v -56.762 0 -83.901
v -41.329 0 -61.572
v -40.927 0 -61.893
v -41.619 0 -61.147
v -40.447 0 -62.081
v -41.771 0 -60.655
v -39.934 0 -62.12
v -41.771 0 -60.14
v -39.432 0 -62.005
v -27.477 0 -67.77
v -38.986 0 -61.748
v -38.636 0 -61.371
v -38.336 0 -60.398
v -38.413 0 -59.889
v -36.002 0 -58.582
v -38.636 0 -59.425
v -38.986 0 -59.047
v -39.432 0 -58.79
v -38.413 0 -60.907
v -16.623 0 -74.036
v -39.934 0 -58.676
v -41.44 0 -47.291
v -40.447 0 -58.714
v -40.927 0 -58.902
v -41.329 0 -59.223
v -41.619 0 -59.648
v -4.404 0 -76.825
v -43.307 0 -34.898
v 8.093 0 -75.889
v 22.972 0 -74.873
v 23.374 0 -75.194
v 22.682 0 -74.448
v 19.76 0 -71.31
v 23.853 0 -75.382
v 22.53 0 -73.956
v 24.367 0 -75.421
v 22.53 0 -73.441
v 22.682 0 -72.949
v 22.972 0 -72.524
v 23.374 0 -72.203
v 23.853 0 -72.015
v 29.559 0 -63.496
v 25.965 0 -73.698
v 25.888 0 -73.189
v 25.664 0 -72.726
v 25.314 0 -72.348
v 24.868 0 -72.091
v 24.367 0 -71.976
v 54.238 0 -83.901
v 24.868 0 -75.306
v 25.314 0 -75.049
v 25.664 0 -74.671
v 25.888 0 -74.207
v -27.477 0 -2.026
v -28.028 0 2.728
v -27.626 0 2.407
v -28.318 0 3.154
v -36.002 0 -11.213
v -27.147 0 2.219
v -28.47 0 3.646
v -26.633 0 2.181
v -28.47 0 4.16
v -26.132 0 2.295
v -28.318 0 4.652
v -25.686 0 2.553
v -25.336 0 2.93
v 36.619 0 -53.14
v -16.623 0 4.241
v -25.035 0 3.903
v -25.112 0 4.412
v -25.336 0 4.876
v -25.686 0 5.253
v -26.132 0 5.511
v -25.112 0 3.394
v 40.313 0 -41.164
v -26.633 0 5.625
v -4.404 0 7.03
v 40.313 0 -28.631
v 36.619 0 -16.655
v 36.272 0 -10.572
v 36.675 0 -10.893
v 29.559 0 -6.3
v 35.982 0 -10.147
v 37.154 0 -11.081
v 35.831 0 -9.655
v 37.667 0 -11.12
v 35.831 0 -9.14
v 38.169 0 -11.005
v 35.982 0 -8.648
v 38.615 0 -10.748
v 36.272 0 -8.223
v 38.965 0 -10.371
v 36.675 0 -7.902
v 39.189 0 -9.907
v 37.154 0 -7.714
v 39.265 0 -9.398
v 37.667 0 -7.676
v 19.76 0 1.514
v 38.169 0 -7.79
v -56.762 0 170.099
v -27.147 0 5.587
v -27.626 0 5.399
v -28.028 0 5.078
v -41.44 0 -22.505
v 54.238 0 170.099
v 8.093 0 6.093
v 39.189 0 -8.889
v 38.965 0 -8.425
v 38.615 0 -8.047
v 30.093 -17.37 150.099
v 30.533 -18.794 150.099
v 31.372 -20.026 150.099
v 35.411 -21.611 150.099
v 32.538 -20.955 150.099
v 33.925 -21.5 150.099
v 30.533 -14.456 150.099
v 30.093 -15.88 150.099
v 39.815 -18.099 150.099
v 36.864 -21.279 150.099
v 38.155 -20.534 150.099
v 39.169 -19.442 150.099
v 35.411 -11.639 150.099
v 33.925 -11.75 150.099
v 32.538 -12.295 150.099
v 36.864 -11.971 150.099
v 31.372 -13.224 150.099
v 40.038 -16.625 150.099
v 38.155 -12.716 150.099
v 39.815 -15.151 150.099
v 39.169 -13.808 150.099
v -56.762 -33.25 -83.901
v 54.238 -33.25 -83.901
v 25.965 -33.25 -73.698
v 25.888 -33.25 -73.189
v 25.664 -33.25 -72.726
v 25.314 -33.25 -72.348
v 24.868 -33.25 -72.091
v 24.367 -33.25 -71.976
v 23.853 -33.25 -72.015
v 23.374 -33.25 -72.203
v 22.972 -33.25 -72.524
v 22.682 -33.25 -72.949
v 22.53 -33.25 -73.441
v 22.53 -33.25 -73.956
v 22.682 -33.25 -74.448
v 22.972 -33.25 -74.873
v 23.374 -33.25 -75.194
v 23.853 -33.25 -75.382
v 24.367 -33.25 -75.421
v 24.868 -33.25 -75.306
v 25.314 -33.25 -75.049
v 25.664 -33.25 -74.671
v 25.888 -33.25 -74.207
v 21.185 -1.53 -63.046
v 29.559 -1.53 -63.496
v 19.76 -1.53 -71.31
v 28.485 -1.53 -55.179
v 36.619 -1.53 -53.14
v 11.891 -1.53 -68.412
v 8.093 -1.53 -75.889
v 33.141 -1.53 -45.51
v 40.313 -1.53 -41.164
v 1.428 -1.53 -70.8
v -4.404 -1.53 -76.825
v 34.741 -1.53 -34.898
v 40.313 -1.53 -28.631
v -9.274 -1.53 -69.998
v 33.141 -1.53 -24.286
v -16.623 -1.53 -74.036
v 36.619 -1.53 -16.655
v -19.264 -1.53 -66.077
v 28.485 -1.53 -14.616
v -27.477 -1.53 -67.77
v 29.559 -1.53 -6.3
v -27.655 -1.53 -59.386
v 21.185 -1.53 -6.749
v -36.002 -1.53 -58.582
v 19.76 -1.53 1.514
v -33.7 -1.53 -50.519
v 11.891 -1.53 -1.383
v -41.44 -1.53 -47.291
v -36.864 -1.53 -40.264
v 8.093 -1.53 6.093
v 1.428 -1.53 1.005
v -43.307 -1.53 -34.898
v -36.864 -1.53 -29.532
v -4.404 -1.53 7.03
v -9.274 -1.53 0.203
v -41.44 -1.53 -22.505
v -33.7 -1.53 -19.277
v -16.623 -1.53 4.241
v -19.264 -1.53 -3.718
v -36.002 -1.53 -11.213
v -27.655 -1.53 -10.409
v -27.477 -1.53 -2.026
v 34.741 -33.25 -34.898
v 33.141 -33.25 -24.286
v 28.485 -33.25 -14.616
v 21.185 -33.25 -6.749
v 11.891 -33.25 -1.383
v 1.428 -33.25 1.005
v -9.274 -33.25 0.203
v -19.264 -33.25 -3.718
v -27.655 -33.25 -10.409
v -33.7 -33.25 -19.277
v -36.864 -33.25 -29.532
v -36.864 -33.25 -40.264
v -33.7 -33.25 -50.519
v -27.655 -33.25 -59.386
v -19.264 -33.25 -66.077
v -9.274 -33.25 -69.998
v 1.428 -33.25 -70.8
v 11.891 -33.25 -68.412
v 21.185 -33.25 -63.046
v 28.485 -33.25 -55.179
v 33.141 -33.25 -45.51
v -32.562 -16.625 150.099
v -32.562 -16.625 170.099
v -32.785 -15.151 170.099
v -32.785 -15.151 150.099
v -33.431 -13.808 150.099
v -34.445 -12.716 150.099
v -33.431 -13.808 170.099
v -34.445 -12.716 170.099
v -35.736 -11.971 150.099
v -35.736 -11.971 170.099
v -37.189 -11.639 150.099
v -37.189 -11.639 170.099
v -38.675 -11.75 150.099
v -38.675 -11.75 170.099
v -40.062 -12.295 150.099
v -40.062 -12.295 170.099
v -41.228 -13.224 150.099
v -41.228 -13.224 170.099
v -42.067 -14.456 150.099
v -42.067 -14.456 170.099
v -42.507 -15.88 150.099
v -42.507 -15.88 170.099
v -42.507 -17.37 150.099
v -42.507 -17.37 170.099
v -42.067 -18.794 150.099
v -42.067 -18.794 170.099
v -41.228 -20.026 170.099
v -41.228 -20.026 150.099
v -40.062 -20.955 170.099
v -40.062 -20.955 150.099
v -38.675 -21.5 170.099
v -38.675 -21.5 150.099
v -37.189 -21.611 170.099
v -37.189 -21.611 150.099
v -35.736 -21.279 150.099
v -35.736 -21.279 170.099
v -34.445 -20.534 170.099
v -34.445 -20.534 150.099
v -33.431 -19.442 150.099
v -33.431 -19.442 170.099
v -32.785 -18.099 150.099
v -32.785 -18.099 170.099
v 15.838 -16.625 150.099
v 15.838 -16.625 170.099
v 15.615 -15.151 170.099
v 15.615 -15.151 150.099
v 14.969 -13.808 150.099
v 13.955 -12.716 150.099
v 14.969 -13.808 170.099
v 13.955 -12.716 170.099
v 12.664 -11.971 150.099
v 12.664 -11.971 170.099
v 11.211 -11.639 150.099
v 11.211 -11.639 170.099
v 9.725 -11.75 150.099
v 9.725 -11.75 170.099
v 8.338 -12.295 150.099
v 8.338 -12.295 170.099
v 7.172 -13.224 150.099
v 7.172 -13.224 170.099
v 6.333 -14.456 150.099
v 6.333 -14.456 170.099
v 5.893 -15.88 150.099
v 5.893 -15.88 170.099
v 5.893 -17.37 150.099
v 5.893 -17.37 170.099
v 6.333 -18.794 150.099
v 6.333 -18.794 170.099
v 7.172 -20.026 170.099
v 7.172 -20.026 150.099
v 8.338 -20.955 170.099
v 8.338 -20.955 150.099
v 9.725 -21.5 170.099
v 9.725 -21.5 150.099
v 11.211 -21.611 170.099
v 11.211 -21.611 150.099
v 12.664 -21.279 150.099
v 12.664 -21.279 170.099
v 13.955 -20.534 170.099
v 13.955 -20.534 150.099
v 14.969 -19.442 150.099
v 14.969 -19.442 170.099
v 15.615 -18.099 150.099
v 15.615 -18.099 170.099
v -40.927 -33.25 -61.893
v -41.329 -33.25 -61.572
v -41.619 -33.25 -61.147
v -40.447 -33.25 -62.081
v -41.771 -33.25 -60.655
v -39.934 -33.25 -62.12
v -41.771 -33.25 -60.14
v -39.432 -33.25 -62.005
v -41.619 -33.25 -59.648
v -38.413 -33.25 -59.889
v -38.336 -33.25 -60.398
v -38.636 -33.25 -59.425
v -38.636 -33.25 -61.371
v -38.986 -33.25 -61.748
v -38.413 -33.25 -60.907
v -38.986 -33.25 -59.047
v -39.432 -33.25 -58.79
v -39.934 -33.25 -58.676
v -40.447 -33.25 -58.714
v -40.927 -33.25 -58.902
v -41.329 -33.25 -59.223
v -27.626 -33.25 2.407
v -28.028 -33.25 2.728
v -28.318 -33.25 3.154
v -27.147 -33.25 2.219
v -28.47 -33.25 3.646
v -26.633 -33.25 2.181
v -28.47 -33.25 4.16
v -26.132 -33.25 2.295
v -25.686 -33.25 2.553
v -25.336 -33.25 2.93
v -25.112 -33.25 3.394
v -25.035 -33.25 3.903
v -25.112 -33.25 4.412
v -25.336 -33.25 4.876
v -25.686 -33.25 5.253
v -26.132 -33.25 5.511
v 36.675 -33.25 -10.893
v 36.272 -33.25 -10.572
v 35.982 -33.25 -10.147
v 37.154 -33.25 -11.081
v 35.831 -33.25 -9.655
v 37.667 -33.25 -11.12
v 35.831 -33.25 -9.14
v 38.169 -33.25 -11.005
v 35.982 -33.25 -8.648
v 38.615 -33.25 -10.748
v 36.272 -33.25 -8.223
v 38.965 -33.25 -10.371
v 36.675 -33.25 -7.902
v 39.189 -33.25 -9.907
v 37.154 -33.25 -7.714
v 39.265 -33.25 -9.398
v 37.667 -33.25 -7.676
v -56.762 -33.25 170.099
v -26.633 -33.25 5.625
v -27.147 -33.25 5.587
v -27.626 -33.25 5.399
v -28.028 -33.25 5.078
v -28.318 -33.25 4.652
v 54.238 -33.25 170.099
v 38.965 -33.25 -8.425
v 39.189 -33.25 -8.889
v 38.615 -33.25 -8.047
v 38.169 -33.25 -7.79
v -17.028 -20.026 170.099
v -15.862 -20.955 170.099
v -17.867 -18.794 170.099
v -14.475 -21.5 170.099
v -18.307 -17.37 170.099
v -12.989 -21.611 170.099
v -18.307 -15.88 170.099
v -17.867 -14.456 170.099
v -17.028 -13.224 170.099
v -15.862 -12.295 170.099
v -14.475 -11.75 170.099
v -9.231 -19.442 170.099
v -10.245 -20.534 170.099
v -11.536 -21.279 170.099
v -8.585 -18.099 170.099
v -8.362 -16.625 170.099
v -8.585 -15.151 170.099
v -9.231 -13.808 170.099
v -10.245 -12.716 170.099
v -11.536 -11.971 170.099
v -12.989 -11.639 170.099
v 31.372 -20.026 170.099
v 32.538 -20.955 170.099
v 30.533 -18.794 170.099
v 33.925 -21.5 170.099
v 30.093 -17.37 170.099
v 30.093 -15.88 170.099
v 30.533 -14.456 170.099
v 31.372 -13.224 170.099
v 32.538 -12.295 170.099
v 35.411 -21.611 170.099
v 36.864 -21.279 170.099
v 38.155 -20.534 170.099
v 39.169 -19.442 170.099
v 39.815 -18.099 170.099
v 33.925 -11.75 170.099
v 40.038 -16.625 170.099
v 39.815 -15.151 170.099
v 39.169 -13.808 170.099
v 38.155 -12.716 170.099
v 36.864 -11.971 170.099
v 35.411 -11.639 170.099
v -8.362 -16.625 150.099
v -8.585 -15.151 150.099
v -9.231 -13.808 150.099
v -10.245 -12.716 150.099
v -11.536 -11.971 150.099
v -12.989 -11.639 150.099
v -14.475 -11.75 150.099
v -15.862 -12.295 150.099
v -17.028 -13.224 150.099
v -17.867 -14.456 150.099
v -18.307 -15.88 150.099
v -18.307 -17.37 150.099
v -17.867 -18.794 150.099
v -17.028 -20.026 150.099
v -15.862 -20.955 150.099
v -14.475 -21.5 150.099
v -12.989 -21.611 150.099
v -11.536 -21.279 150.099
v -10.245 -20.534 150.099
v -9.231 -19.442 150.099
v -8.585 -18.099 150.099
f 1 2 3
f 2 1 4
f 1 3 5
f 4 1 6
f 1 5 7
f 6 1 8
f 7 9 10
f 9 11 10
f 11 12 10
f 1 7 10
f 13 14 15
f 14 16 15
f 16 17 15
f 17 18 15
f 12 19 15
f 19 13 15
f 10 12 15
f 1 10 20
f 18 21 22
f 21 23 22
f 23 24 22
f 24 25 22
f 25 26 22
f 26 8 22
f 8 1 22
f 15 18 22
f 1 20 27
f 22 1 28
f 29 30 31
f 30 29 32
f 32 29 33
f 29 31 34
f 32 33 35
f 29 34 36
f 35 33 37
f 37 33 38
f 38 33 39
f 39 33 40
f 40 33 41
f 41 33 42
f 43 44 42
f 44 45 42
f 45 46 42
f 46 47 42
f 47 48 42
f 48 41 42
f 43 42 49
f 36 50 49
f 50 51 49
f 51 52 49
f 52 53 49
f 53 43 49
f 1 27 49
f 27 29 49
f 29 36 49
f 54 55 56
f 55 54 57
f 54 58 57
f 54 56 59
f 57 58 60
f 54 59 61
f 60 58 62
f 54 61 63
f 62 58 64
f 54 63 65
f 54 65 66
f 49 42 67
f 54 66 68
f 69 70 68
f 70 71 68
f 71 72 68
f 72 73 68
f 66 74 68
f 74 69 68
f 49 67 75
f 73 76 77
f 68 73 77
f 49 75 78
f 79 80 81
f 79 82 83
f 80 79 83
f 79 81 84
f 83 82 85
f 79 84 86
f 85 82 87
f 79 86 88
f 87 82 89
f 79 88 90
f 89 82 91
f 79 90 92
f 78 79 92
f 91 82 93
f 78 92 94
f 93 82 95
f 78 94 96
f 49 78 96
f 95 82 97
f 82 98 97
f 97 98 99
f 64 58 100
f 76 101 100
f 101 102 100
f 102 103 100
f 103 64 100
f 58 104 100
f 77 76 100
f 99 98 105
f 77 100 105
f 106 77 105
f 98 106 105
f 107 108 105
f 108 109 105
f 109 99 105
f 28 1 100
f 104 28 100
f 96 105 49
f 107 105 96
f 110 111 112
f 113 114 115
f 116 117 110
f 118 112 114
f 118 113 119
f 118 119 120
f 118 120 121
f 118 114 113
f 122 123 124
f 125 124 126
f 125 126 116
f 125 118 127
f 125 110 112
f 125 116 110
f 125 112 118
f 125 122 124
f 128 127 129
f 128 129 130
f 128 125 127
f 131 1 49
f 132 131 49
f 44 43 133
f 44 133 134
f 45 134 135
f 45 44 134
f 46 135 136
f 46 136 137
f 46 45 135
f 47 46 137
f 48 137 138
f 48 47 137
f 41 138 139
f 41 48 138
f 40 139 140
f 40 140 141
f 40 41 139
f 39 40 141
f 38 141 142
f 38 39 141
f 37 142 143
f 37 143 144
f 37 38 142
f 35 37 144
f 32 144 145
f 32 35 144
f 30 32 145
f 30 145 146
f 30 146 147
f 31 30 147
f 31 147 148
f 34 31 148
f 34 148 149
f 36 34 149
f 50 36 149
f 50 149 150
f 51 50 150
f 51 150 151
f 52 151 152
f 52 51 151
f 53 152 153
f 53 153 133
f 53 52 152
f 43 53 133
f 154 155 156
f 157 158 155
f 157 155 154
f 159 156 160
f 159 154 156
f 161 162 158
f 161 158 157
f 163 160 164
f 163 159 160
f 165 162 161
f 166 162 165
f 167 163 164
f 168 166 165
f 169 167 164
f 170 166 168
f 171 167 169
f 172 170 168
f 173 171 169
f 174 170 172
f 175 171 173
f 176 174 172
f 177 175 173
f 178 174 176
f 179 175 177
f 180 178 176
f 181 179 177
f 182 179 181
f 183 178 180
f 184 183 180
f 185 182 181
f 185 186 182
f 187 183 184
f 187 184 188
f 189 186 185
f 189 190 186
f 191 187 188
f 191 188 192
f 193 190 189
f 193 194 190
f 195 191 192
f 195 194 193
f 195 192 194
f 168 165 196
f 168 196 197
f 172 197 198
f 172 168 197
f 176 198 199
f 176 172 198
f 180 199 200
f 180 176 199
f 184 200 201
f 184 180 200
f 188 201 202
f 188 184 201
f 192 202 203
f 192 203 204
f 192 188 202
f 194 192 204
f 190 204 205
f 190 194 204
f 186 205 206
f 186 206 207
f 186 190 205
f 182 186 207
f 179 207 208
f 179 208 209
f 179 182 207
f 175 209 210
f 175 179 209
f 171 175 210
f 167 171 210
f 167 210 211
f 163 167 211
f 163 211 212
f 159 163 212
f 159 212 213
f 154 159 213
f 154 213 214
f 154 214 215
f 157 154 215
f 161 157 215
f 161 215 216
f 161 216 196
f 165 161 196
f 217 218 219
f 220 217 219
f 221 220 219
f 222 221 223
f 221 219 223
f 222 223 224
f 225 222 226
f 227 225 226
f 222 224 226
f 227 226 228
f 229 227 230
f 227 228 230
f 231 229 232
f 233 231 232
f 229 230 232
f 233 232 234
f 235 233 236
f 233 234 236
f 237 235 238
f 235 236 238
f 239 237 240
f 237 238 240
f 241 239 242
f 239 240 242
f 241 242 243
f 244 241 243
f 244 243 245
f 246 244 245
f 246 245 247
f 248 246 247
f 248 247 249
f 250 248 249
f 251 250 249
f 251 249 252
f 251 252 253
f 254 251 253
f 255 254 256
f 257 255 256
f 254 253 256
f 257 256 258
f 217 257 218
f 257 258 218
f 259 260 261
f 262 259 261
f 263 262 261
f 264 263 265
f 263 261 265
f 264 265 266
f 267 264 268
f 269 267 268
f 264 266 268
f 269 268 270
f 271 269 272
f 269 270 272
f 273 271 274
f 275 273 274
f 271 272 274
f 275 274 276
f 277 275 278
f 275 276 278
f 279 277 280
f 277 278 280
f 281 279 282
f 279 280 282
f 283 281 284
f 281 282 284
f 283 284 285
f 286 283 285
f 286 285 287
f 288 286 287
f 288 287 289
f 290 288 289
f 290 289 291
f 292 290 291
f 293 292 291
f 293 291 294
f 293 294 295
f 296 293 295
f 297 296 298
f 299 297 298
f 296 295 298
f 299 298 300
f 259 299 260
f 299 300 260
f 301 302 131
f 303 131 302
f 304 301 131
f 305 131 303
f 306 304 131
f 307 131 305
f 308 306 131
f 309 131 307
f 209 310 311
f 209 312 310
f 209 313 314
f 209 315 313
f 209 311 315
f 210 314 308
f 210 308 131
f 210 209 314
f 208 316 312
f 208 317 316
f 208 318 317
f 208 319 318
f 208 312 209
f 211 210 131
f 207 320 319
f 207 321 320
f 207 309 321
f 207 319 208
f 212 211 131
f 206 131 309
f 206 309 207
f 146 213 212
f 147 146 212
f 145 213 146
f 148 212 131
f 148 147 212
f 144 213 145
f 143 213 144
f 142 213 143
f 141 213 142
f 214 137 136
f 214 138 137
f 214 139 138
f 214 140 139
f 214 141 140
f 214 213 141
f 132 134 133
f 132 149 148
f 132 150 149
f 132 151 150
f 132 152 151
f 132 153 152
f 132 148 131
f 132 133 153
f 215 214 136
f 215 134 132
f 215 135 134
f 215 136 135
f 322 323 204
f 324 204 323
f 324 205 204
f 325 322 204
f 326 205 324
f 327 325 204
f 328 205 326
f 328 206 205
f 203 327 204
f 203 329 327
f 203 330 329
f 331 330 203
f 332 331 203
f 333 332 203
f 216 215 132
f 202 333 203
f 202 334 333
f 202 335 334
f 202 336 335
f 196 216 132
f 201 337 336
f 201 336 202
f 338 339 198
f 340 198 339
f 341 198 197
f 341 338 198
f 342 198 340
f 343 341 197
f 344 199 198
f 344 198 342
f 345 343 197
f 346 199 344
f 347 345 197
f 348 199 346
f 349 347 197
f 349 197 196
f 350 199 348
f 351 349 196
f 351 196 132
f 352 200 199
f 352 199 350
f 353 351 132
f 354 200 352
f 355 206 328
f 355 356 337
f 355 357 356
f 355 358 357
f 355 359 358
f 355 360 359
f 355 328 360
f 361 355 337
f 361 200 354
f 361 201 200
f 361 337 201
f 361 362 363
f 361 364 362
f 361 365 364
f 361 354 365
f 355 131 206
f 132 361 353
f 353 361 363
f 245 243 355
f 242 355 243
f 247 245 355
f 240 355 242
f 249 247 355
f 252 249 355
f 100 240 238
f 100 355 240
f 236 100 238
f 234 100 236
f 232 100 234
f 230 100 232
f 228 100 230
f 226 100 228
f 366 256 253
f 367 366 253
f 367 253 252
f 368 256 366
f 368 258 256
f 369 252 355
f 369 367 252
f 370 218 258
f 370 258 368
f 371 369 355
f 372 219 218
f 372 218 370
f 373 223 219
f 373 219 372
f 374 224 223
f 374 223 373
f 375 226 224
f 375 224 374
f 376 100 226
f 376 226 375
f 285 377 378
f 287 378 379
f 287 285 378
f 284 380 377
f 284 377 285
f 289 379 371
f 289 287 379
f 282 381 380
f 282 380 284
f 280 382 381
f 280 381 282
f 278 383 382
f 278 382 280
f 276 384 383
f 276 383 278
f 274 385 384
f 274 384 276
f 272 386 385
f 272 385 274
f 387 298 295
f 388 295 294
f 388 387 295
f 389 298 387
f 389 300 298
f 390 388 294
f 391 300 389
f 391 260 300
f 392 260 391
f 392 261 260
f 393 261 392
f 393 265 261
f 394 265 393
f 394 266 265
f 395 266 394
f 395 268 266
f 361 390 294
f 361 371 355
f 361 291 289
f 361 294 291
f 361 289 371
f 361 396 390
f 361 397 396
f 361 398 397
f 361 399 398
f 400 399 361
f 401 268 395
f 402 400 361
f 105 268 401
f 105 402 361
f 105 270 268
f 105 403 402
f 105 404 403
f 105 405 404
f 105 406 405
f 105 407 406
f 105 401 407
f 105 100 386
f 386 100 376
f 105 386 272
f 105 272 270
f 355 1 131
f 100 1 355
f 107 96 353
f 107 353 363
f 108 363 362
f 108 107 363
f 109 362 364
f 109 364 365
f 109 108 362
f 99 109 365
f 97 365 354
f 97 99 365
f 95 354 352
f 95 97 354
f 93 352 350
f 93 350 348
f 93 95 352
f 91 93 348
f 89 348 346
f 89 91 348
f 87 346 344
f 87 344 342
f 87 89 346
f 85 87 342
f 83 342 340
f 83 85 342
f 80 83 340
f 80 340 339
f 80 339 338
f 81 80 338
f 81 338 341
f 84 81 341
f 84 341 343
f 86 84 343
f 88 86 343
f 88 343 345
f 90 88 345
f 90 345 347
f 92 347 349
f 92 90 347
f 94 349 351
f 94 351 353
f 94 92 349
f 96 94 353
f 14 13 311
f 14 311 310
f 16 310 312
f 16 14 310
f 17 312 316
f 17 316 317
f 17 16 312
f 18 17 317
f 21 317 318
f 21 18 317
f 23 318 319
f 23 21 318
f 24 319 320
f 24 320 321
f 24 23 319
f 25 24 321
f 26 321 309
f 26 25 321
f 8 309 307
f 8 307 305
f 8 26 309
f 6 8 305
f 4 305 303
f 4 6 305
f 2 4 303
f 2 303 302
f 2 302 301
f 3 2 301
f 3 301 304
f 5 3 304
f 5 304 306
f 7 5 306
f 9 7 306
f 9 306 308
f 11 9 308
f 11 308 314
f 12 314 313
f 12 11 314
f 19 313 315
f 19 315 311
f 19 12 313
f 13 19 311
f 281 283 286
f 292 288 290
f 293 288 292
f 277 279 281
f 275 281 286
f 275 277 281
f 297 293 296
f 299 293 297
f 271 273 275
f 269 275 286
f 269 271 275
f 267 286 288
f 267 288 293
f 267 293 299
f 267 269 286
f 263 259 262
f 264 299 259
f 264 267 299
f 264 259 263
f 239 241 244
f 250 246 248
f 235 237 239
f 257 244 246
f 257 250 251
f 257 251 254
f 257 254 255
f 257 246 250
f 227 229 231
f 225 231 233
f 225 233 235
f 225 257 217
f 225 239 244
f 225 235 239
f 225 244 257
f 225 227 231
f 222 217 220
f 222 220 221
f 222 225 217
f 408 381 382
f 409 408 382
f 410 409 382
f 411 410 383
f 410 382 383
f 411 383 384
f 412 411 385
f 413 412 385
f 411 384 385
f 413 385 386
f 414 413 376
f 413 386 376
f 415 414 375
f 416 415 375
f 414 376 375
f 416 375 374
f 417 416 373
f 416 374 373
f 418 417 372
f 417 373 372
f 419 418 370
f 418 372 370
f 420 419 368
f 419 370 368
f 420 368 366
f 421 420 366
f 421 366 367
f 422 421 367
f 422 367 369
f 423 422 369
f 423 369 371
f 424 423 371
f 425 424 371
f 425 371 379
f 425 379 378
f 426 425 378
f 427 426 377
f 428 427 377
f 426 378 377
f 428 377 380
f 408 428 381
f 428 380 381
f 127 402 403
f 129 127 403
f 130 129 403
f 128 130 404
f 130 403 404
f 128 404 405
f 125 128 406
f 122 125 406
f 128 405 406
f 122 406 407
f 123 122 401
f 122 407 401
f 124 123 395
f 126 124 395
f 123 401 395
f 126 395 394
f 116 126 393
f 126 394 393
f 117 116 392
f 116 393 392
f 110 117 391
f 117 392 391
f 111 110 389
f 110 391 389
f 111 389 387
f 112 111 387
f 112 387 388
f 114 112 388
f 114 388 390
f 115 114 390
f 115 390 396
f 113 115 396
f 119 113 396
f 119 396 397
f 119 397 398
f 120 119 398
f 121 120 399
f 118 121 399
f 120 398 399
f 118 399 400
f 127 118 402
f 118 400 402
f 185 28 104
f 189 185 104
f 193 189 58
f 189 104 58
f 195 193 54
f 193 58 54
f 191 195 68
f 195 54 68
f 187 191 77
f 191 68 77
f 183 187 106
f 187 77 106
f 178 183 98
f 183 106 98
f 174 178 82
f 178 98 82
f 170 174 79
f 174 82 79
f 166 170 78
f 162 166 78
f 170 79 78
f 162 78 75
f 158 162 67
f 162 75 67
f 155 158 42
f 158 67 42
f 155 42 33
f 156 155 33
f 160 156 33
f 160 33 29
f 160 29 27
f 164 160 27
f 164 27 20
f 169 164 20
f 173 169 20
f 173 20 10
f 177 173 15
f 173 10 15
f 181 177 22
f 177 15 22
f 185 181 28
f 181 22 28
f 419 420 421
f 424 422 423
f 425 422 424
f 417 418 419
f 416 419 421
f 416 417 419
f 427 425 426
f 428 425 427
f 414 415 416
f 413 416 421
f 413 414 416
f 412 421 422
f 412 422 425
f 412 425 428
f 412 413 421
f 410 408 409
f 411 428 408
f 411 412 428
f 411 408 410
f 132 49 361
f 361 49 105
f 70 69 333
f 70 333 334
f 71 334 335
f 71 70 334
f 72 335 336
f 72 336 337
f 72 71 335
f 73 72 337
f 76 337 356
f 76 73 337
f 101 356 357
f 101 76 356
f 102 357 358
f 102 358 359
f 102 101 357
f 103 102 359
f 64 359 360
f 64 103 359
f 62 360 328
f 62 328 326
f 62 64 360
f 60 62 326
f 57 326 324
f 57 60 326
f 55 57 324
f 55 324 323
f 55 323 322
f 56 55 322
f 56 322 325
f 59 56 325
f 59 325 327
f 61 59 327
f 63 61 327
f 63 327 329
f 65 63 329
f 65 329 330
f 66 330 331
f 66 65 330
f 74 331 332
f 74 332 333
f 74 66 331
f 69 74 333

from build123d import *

# Parameters (mm, degrees)
F0_W     = 111
F0_H     = 254
F0_R     = 1.727
F0_R_2   = 36.003175
F1_DEPTH = 33.25
F2_R     = 42.045
F3_DEPTH = 1.53
F4_R     = 5
F5_DEPTH = 20


with BuildPart() as f1:
    # F0 (on Front) → F1 (new body)
    with BuildSketch(Plane.XZ):
        with Locations((-1.262473, 43.099124)):
            Rectangle(F0_W, F0_H)
        with Locations((-40.06318, -60.397701)):
            Circle(F0_R, mode=Mode.SUBTRACT)
        with Locations((-1.262473, -34.897701)):
            Circle(F0_R_2, mode=Mode.SUBTRACT)
        with Locations((-26.762473, 3.903007)):
            Circle(F0_R, mode=Mode.SUBTRACT)
        with Locations((24.237527, -73.698408)):
            Circle(F0_R, mode=Mode.SUBTRACT)
        with Locations((37.538235, -9.397701)):
            Circle(F0_R, mode=Mode.SUBTRACT)
    extrude(amount=F1_DEPTH)

    # F2 (on face) → F3 (cut)
    with BuildSketch(Plane(origin=(0, 0, 0), x_dir=(-1, 0, 0), z_dir=(0, 1, 0))):
        with Locations((1.262473, -34.897701)):
            Circle(F2_R)
    extrude(amount=-F3_DEPTH, mode=Mode.SUBTRACT)

    # F4 (on face) → F5 (cut)
    with BuildSketch(Plane.XY.offset(170.099124)):
        with Locations((-37.562473, -16.625)):
            Circle(F4_R)
        with Locations((-13.362473, -16.625)):
            Circle(F4_R)
        with Locations((10.837527, -16.625)):
            Circle(F4_R)
        with Locations((35.037527, -16.625)):
            Circle(F4_R)
    extrude(amount=-F5_DEPTH, mode=Mode.SUBTRACT)


solid = f1.part
